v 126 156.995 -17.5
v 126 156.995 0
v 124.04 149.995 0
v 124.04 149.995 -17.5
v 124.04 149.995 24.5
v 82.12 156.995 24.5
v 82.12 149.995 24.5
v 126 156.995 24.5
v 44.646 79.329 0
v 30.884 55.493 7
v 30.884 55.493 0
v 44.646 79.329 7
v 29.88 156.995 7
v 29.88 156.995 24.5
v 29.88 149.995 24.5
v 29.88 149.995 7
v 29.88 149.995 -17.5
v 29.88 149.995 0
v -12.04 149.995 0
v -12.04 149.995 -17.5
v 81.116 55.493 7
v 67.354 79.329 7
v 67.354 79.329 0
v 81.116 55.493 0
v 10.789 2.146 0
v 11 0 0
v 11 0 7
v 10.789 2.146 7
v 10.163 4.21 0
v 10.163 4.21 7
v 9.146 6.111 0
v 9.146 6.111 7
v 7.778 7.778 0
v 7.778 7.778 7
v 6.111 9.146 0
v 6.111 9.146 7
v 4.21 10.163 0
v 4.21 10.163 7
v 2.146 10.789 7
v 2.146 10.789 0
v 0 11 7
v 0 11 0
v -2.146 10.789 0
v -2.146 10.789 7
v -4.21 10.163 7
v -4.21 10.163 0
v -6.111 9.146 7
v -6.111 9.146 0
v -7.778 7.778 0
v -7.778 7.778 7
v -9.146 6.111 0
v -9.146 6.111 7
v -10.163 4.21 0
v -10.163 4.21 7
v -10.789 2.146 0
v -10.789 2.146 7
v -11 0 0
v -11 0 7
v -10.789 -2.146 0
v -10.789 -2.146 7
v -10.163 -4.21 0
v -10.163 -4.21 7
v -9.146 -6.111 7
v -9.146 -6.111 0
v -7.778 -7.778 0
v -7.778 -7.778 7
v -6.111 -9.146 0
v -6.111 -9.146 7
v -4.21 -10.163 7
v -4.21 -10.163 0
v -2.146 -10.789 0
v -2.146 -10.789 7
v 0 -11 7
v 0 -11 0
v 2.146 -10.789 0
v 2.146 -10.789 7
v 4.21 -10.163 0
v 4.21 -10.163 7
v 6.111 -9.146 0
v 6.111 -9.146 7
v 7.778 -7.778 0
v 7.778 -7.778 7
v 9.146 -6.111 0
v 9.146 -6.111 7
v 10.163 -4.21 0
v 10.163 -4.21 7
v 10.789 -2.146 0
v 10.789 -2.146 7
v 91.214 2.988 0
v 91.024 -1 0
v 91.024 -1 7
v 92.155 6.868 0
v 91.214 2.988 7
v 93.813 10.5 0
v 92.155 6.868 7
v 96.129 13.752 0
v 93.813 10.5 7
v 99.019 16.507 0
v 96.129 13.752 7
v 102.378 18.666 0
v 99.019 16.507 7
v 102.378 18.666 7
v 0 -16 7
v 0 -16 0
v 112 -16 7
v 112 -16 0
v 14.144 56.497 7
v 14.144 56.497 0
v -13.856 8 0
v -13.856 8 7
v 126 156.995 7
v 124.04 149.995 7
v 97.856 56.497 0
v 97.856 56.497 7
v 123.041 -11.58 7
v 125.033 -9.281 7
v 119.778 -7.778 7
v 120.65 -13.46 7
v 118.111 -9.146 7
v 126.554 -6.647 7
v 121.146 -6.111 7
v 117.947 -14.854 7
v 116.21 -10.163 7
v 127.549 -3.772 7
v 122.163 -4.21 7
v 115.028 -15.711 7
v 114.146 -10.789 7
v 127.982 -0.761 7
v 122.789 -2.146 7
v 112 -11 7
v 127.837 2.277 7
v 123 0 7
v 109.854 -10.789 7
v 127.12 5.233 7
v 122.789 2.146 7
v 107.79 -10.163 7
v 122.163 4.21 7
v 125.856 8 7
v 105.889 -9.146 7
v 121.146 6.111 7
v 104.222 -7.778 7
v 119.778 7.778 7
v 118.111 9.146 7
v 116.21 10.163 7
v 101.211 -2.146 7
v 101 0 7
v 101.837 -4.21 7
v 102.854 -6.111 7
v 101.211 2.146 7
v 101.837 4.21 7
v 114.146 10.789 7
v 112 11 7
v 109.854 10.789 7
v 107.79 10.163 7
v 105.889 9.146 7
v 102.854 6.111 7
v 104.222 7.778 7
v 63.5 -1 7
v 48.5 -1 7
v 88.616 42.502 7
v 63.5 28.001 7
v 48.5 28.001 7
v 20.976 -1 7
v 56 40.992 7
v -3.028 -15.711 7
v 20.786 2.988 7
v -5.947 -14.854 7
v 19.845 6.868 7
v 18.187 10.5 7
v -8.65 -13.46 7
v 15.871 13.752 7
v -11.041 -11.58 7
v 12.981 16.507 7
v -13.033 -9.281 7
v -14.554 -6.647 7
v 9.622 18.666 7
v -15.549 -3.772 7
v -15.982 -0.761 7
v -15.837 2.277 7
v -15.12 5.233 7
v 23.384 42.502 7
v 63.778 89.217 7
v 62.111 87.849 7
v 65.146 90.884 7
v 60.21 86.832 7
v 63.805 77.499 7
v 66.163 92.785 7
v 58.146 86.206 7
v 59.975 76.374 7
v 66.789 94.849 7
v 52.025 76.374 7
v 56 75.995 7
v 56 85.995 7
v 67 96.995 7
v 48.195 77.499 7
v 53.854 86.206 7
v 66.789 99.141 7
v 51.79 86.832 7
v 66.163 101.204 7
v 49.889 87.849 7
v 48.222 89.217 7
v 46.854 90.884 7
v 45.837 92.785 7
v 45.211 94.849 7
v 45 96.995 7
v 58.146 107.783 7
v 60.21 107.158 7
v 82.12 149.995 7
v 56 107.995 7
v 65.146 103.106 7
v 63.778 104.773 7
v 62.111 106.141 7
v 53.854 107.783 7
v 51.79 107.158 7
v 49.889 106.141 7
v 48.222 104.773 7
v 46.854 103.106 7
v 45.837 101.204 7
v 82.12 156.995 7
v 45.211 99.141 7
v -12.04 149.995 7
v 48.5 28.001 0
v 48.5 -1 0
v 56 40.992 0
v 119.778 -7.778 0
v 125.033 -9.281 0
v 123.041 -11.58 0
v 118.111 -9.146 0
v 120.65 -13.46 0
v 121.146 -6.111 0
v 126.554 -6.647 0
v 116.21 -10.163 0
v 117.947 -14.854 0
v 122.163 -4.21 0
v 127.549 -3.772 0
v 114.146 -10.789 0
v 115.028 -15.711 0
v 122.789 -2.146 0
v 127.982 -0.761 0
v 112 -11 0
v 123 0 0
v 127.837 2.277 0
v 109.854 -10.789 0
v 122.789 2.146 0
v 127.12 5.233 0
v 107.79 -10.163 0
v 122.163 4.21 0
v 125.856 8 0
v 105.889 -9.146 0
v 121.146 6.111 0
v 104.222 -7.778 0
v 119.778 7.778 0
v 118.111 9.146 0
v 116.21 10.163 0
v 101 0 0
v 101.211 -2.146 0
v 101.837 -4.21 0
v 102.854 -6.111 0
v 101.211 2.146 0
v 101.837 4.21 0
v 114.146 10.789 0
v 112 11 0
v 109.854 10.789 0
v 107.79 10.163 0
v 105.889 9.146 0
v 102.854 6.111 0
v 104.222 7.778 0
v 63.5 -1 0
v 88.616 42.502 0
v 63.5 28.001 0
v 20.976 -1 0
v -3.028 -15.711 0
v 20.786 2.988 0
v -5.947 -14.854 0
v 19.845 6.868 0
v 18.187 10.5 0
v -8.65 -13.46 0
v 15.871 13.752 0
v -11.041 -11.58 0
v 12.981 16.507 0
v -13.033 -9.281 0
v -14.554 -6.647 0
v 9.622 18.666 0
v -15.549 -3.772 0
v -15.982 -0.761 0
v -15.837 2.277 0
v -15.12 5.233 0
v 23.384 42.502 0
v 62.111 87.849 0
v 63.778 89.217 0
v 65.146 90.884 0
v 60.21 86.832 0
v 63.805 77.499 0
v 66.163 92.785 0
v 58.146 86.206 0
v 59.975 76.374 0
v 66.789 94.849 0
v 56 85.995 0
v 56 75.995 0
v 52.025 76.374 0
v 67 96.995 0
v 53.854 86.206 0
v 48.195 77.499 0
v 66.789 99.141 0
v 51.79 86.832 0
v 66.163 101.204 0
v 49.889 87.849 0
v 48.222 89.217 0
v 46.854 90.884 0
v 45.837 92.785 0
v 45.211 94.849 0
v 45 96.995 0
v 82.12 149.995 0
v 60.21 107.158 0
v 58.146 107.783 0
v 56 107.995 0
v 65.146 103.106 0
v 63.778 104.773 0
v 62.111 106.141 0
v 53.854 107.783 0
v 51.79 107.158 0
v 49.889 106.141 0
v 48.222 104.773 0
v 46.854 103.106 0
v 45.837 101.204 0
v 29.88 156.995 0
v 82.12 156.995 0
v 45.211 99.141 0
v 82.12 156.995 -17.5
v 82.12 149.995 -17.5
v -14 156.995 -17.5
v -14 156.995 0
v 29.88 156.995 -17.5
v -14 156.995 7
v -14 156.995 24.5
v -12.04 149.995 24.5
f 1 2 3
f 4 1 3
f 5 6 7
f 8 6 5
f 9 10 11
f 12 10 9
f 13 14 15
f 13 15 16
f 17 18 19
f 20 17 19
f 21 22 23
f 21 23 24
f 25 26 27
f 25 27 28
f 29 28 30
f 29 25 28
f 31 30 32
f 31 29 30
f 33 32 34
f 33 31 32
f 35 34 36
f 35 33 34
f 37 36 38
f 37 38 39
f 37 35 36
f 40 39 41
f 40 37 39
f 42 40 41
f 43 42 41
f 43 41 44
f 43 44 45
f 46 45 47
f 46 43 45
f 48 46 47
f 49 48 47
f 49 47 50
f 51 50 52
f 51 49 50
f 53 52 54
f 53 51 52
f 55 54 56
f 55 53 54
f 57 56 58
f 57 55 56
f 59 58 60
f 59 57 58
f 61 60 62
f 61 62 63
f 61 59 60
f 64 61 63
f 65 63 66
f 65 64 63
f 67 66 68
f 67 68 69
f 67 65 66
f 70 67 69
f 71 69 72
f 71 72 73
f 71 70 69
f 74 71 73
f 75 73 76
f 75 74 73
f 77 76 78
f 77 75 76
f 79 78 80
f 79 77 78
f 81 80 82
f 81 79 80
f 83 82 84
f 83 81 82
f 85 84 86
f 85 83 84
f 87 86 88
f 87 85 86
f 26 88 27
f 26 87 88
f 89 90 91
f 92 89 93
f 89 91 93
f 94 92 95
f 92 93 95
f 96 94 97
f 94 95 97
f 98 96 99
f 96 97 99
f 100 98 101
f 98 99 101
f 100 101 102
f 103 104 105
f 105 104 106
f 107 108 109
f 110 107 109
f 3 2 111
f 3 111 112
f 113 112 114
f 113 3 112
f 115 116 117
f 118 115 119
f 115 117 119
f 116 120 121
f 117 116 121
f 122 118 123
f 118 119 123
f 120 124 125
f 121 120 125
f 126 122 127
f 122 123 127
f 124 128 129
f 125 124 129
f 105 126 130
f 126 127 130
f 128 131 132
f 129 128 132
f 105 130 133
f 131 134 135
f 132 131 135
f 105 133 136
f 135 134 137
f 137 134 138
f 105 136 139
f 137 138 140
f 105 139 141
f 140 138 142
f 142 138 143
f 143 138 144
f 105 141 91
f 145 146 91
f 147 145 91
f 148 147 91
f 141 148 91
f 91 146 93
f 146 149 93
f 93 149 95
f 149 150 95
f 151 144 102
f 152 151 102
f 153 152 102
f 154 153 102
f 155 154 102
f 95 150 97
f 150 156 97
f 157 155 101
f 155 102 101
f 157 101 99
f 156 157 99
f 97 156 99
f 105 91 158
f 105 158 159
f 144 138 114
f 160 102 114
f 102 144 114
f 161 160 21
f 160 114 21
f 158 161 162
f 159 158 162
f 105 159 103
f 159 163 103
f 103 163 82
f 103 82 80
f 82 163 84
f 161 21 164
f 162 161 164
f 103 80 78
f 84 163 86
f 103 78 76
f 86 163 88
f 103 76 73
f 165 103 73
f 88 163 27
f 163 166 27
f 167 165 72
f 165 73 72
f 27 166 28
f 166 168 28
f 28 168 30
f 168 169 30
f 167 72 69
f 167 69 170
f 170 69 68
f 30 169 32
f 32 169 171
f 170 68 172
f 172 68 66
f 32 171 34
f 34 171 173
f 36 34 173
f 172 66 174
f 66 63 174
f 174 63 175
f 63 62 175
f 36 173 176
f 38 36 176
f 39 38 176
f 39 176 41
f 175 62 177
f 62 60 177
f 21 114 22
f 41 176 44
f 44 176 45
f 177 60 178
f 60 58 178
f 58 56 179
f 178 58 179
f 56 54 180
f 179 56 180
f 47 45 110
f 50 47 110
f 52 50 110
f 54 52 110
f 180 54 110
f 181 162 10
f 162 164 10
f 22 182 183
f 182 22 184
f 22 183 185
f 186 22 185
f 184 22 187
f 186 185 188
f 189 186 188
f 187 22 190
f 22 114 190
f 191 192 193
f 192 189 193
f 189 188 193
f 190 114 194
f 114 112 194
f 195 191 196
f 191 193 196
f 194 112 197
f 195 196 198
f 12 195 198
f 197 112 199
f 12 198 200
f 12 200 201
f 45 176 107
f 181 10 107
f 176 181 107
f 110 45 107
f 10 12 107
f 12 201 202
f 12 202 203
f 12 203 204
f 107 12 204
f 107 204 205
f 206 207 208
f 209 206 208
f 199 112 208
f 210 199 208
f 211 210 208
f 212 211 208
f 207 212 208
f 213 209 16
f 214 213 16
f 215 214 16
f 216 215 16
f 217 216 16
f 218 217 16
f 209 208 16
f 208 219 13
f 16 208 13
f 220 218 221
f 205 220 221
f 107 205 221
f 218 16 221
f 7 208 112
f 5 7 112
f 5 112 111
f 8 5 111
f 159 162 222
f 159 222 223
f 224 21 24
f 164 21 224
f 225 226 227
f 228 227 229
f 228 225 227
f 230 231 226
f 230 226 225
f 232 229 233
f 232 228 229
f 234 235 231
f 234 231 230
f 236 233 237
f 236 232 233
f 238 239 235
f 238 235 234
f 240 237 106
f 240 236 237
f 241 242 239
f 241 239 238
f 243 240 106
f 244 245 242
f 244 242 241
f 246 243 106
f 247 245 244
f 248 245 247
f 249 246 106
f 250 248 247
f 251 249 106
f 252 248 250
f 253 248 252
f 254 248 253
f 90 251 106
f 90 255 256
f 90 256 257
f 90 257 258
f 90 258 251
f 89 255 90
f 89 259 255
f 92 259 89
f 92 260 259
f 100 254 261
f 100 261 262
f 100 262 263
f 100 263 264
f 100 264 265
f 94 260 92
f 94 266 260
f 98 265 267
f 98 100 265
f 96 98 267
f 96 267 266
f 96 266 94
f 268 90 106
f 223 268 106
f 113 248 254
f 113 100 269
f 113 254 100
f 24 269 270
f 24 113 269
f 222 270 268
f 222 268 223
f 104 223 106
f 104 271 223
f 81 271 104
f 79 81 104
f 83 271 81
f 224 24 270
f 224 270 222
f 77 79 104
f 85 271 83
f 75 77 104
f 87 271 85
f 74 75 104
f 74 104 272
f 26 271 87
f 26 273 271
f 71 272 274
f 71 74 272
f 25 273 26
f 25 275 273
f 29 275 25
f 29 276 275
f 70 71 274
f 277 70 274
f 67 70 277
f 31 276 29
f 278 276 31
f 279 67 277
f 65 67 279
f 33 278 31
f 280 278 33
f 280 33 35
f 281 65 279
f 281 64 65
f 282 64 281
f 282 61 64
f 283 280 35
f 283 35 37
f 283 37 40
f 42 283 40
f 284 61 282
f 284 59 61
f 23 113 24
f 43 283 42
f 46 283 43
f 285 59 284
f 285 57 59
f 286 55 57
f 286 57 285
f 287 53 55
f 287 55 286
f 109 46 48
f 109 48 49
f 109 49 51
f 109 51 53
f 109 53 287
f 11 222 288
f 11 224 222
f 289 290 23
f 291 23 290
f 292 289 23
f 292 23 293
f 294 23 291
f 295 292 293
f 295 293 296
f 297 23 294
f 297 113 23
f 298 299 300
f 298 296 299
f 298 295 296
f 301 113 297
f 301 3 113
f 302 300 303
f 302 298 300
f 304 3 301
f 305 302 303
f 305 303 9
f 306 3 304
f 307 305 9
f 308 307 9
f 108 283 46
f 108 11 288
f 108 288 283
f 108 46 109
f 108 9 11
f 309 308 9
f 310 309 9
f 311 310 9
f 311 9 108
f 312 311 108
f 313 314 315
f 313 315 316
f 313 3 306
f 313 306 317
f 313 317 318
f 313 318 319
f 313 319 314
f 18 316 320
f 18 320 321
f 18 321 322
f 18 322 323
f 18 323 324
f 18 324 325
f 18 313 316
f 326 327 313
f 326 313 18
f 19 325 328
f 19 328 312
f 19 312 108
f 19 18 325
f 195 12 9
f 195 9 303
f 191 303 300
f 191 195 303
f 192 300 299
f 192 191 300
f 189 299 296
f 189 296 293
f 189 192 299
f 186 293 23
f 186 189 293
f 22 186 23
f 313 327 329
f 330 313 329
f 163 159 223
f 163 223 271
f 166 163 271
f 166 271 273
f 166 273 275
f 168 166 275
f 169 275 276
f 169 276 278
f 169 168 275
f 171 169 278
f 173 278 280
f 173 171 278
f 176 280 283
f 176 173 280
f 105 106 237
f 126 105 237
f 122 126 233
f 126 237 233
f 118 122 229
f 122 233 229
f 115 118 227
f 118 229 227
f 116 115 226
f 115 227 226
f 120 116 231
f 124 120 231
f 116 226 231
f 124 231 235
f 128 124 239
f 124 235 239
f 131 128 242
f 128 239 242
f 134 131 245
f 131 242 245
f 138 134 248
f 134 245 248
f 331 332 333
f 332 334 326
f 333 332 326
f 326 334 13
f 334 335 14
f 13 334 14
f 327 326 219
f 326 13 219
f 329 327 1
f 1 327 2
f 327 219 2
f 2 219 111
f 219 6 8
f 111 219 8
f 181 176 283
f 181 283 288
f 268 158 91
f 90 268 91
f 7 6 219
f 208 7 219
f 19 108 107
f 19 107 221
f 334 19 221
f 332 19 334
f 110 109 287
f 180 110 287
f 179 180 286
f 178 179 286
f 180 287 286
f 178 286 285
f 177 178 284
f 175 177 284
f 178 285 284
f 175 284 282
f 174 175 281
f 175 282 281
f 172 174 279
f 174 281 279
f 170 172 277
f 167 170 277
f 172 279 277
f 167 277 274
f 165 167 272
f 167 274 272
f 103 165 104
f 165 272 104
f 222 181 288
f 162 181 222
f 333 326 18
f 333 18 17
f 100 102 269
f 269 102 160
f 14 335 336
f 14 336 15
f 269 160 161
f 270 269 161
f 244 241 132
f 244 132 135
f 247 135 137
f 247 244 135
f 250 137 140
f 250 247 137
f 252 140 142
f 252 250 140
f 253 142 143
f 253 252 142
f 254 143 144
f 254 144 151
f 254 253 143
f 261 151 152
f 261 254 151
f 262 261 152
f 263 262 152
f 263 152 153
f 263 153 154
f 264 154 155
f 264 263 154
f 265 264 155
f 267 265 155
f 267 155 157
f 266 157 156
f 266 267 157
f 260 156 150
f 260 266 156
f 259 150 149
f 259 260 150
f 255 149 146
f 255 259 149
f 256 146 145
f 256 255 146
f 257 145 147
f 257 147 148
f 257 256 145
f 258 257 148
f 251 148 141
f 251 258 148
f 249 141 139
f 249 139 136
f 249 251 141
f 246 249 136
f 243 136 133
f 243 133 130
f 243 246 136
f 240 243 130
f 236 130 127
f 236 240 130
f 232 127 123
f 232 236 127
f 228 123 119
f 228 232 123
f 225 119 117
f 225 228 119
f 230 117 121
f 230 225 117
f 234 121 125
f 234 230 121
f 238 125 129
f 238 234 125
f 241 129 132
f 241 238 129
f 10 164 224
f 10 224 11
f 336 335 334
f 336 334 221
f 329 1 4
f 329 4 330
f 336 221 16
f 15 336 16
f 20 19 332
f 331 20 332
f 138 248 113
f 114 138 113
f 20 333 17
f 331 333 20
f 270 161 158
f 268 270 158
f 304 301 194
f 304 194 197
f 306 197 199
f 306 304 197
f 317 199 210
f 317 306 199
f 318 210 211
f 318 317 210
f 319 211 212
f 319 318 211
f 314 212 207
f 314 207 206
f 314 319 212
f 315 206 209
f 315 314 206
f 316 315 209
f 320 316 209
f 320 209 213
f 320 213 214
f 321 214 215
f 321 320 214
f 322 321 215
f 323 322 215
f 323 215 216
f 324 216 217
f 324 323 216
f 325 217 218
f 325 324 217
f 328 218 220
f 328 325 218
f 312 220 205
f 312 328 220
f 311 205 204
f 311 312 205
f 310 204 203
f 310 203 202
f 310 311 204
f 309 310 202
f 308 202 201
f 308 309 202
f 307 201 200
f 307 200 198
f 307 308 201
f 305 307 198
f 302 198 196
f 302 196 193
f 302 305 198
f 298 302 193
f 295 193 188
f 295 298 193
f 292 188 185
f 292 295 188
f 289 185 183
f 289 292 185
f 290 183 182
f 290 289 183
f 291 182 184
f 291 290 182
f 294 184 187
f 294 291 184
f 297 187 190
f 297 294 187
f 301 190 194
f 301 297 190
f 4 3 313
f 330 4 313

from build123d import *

# Parameters (mm, degrees)
SKETCH1_R           = 11
BOSS_EXTRUDE1_DEPTH = 7
CUT_EXTRUDE1_DEPTH  = 8
BOSS_EXTRUDE2_DEPTH = 7
BOSS_EXTRUDE3_DEPTH = 17.5
BOSS_EXTRUDE4_DEPTH = 17.5
SKETCH10_W          = 52.24
SKETCH10_H          = 17.5
CUT_EXTRUDE2_DEPTH  = 173.994845224


with BuildPart() as part:
    # Sketch1 → Boss-Extrude1 (new body)
    with BuildSketch(Plane.XY):
        with BuildLine():
            Line((42.143593539, 104.994845224), (-13.856406461, 8))
            ThreePointArc((-13.856406461, 8), (-13.856406461, -8), (0, -16))
            Line((0, -16), (112, -16))
            ThreePointArc((112, -16), (125.856406461, -8), (125.856406461, 8))
            Line((125.856406461, 8), (69.856406461, 104.994845224))
            ThreePointArc((69.856406461, 104.994845224), (56, 112.994845224), (42.143593539, 104.994845224))
        make_face()
        Circle(SKETCH1_R, mode=Mode.SUBTRACT)
        with Locations((112, 0)):
            Circle(SKETCH1_R, mode=Mode.SUBTRACT)
        with Locations((56, 96.994845224)):
            Circle(SKETCH1_R, mode=Mode.SUBTRACT)
    extrude(amount=BOSS_EXTRUDE1_DEPTH)

    # Sketch2 → Cut-Extrude1 (cut, through all)
    with BuildSketch(Plane.XY.offset(7)):
        with BuildLine():
            Line((9.622063078, 18.665902125), (23.383974596, 42.502232084))
            Line((23.383974596, 42.502232084), (48.5, 28.001488056))
            Line((48.5, 28.001488056), (48.5, -1))
            Line((48.5, -1), (20.976176963, -1))
            ThreePointArc((20.976176963, -1), (18.186533479, 10.5), (9.622063078, 18.665902125))
        make_face()
        with BuildLine():
            Line((63.5, -1), (91.023823037, -1))
            ThreePointArc((91.023823037, -1), (93.813466521, 10.5), (102.377936922, 18.665902125))
            Line((102.377936922, 18.665902125), (88.616025404, 42.502232084))
            Line((88.616025404, 42.502232084), (63.5, 28.001488056))
            Line((63.5, 28.001488056), (63.5, -1))
        make_face()
        with BuildLine():
            Line((30.883974596, 55.49261314), (44.645886115, 79.328943099))
            ThreePointArc((44.645886115, 79.328943099), (56, 75.994845224), (67.354113885, 79.328943099))
            Line((67.354113885, 79.328943099), (81.116025404, 55.49261314))
            Line((81.116025404, 55.49261314), (56, 40.991869112))
            Line((56, 40.991869112), (30.883974596, 55.49261314))
        make_face()
    extrude(amount=-CUT_EXTRUDE1_DEPTH, mode=Mode.SUBTRACT)

    # Sketch7 → Boss-Extrude2 (add)
    with BuildSketch(Plane.XY):
        with BuildLine():
            Line((-14, 156.994845224), (126, 156.994845224))
            Line((126, 156.994845224), (97.856406461, 56.497422612))
            Line((97.856406461, 56.497422612), (69.856406461, 104.994845224))
            ThreePointArc((69.856406461, 104.994845224), (56, 112.994845224), (42.143593539, 104.994845224))
            Line((42.143593539, 104.994845224), (14.143593539, 56.497422612))
            Line((14.143593539, 56.497422612), (-14, 156.994845224))
        make_face()
    extrude(amount=BOSS_EXTRUDE2_DEPTH)

    # Sketch8 → Boss-Extrude3 (add)
    with BuildSketch(Plane.XY.offset(7)):
        Polygon((-12.039699431, 149.994845224), (124.039699431, 149.994845224), (126, 156.994845224), (-14, 156.994845224), align=None)
    extrude(amount=BOSS_EXTRUDE3_DEPTH)

    # Sketch9 → Boss-Extrude4 (add)
    with BuildSketch(Plane(origin=(0, 0, 0), x_dir=(-1, 0, 0), z_dir=(0, 0, -1))):
        Polygon((-124.039699431, 149.994845224), (12.039699431, 149.994845224), (14, 156.994845224), (-126, 156.994845224), align=None)
    extrude(amount=BOSS_EXTRUDE4_DEPTH)

    # Sketch10 → Cut-Extrude2 (cut, through all)
    with BuildSketch(Plane(origin=(0, 156.994845224, 0), x_dir=(1, 0, 0), z_dir=(0, 1, 0))):
        with Locations((56, -15.75)):
            Rectangle(SKETCH10_W, SKETCH10_H)
        with Locations((56, 8.75)):
            Rectangle(SKETCH10_W, SKETCH10_H)
    extrude(amount=-CUT_EXTRUDE2_DEPTH, mode=Mode.SUBTRACT)


solid = part.part
